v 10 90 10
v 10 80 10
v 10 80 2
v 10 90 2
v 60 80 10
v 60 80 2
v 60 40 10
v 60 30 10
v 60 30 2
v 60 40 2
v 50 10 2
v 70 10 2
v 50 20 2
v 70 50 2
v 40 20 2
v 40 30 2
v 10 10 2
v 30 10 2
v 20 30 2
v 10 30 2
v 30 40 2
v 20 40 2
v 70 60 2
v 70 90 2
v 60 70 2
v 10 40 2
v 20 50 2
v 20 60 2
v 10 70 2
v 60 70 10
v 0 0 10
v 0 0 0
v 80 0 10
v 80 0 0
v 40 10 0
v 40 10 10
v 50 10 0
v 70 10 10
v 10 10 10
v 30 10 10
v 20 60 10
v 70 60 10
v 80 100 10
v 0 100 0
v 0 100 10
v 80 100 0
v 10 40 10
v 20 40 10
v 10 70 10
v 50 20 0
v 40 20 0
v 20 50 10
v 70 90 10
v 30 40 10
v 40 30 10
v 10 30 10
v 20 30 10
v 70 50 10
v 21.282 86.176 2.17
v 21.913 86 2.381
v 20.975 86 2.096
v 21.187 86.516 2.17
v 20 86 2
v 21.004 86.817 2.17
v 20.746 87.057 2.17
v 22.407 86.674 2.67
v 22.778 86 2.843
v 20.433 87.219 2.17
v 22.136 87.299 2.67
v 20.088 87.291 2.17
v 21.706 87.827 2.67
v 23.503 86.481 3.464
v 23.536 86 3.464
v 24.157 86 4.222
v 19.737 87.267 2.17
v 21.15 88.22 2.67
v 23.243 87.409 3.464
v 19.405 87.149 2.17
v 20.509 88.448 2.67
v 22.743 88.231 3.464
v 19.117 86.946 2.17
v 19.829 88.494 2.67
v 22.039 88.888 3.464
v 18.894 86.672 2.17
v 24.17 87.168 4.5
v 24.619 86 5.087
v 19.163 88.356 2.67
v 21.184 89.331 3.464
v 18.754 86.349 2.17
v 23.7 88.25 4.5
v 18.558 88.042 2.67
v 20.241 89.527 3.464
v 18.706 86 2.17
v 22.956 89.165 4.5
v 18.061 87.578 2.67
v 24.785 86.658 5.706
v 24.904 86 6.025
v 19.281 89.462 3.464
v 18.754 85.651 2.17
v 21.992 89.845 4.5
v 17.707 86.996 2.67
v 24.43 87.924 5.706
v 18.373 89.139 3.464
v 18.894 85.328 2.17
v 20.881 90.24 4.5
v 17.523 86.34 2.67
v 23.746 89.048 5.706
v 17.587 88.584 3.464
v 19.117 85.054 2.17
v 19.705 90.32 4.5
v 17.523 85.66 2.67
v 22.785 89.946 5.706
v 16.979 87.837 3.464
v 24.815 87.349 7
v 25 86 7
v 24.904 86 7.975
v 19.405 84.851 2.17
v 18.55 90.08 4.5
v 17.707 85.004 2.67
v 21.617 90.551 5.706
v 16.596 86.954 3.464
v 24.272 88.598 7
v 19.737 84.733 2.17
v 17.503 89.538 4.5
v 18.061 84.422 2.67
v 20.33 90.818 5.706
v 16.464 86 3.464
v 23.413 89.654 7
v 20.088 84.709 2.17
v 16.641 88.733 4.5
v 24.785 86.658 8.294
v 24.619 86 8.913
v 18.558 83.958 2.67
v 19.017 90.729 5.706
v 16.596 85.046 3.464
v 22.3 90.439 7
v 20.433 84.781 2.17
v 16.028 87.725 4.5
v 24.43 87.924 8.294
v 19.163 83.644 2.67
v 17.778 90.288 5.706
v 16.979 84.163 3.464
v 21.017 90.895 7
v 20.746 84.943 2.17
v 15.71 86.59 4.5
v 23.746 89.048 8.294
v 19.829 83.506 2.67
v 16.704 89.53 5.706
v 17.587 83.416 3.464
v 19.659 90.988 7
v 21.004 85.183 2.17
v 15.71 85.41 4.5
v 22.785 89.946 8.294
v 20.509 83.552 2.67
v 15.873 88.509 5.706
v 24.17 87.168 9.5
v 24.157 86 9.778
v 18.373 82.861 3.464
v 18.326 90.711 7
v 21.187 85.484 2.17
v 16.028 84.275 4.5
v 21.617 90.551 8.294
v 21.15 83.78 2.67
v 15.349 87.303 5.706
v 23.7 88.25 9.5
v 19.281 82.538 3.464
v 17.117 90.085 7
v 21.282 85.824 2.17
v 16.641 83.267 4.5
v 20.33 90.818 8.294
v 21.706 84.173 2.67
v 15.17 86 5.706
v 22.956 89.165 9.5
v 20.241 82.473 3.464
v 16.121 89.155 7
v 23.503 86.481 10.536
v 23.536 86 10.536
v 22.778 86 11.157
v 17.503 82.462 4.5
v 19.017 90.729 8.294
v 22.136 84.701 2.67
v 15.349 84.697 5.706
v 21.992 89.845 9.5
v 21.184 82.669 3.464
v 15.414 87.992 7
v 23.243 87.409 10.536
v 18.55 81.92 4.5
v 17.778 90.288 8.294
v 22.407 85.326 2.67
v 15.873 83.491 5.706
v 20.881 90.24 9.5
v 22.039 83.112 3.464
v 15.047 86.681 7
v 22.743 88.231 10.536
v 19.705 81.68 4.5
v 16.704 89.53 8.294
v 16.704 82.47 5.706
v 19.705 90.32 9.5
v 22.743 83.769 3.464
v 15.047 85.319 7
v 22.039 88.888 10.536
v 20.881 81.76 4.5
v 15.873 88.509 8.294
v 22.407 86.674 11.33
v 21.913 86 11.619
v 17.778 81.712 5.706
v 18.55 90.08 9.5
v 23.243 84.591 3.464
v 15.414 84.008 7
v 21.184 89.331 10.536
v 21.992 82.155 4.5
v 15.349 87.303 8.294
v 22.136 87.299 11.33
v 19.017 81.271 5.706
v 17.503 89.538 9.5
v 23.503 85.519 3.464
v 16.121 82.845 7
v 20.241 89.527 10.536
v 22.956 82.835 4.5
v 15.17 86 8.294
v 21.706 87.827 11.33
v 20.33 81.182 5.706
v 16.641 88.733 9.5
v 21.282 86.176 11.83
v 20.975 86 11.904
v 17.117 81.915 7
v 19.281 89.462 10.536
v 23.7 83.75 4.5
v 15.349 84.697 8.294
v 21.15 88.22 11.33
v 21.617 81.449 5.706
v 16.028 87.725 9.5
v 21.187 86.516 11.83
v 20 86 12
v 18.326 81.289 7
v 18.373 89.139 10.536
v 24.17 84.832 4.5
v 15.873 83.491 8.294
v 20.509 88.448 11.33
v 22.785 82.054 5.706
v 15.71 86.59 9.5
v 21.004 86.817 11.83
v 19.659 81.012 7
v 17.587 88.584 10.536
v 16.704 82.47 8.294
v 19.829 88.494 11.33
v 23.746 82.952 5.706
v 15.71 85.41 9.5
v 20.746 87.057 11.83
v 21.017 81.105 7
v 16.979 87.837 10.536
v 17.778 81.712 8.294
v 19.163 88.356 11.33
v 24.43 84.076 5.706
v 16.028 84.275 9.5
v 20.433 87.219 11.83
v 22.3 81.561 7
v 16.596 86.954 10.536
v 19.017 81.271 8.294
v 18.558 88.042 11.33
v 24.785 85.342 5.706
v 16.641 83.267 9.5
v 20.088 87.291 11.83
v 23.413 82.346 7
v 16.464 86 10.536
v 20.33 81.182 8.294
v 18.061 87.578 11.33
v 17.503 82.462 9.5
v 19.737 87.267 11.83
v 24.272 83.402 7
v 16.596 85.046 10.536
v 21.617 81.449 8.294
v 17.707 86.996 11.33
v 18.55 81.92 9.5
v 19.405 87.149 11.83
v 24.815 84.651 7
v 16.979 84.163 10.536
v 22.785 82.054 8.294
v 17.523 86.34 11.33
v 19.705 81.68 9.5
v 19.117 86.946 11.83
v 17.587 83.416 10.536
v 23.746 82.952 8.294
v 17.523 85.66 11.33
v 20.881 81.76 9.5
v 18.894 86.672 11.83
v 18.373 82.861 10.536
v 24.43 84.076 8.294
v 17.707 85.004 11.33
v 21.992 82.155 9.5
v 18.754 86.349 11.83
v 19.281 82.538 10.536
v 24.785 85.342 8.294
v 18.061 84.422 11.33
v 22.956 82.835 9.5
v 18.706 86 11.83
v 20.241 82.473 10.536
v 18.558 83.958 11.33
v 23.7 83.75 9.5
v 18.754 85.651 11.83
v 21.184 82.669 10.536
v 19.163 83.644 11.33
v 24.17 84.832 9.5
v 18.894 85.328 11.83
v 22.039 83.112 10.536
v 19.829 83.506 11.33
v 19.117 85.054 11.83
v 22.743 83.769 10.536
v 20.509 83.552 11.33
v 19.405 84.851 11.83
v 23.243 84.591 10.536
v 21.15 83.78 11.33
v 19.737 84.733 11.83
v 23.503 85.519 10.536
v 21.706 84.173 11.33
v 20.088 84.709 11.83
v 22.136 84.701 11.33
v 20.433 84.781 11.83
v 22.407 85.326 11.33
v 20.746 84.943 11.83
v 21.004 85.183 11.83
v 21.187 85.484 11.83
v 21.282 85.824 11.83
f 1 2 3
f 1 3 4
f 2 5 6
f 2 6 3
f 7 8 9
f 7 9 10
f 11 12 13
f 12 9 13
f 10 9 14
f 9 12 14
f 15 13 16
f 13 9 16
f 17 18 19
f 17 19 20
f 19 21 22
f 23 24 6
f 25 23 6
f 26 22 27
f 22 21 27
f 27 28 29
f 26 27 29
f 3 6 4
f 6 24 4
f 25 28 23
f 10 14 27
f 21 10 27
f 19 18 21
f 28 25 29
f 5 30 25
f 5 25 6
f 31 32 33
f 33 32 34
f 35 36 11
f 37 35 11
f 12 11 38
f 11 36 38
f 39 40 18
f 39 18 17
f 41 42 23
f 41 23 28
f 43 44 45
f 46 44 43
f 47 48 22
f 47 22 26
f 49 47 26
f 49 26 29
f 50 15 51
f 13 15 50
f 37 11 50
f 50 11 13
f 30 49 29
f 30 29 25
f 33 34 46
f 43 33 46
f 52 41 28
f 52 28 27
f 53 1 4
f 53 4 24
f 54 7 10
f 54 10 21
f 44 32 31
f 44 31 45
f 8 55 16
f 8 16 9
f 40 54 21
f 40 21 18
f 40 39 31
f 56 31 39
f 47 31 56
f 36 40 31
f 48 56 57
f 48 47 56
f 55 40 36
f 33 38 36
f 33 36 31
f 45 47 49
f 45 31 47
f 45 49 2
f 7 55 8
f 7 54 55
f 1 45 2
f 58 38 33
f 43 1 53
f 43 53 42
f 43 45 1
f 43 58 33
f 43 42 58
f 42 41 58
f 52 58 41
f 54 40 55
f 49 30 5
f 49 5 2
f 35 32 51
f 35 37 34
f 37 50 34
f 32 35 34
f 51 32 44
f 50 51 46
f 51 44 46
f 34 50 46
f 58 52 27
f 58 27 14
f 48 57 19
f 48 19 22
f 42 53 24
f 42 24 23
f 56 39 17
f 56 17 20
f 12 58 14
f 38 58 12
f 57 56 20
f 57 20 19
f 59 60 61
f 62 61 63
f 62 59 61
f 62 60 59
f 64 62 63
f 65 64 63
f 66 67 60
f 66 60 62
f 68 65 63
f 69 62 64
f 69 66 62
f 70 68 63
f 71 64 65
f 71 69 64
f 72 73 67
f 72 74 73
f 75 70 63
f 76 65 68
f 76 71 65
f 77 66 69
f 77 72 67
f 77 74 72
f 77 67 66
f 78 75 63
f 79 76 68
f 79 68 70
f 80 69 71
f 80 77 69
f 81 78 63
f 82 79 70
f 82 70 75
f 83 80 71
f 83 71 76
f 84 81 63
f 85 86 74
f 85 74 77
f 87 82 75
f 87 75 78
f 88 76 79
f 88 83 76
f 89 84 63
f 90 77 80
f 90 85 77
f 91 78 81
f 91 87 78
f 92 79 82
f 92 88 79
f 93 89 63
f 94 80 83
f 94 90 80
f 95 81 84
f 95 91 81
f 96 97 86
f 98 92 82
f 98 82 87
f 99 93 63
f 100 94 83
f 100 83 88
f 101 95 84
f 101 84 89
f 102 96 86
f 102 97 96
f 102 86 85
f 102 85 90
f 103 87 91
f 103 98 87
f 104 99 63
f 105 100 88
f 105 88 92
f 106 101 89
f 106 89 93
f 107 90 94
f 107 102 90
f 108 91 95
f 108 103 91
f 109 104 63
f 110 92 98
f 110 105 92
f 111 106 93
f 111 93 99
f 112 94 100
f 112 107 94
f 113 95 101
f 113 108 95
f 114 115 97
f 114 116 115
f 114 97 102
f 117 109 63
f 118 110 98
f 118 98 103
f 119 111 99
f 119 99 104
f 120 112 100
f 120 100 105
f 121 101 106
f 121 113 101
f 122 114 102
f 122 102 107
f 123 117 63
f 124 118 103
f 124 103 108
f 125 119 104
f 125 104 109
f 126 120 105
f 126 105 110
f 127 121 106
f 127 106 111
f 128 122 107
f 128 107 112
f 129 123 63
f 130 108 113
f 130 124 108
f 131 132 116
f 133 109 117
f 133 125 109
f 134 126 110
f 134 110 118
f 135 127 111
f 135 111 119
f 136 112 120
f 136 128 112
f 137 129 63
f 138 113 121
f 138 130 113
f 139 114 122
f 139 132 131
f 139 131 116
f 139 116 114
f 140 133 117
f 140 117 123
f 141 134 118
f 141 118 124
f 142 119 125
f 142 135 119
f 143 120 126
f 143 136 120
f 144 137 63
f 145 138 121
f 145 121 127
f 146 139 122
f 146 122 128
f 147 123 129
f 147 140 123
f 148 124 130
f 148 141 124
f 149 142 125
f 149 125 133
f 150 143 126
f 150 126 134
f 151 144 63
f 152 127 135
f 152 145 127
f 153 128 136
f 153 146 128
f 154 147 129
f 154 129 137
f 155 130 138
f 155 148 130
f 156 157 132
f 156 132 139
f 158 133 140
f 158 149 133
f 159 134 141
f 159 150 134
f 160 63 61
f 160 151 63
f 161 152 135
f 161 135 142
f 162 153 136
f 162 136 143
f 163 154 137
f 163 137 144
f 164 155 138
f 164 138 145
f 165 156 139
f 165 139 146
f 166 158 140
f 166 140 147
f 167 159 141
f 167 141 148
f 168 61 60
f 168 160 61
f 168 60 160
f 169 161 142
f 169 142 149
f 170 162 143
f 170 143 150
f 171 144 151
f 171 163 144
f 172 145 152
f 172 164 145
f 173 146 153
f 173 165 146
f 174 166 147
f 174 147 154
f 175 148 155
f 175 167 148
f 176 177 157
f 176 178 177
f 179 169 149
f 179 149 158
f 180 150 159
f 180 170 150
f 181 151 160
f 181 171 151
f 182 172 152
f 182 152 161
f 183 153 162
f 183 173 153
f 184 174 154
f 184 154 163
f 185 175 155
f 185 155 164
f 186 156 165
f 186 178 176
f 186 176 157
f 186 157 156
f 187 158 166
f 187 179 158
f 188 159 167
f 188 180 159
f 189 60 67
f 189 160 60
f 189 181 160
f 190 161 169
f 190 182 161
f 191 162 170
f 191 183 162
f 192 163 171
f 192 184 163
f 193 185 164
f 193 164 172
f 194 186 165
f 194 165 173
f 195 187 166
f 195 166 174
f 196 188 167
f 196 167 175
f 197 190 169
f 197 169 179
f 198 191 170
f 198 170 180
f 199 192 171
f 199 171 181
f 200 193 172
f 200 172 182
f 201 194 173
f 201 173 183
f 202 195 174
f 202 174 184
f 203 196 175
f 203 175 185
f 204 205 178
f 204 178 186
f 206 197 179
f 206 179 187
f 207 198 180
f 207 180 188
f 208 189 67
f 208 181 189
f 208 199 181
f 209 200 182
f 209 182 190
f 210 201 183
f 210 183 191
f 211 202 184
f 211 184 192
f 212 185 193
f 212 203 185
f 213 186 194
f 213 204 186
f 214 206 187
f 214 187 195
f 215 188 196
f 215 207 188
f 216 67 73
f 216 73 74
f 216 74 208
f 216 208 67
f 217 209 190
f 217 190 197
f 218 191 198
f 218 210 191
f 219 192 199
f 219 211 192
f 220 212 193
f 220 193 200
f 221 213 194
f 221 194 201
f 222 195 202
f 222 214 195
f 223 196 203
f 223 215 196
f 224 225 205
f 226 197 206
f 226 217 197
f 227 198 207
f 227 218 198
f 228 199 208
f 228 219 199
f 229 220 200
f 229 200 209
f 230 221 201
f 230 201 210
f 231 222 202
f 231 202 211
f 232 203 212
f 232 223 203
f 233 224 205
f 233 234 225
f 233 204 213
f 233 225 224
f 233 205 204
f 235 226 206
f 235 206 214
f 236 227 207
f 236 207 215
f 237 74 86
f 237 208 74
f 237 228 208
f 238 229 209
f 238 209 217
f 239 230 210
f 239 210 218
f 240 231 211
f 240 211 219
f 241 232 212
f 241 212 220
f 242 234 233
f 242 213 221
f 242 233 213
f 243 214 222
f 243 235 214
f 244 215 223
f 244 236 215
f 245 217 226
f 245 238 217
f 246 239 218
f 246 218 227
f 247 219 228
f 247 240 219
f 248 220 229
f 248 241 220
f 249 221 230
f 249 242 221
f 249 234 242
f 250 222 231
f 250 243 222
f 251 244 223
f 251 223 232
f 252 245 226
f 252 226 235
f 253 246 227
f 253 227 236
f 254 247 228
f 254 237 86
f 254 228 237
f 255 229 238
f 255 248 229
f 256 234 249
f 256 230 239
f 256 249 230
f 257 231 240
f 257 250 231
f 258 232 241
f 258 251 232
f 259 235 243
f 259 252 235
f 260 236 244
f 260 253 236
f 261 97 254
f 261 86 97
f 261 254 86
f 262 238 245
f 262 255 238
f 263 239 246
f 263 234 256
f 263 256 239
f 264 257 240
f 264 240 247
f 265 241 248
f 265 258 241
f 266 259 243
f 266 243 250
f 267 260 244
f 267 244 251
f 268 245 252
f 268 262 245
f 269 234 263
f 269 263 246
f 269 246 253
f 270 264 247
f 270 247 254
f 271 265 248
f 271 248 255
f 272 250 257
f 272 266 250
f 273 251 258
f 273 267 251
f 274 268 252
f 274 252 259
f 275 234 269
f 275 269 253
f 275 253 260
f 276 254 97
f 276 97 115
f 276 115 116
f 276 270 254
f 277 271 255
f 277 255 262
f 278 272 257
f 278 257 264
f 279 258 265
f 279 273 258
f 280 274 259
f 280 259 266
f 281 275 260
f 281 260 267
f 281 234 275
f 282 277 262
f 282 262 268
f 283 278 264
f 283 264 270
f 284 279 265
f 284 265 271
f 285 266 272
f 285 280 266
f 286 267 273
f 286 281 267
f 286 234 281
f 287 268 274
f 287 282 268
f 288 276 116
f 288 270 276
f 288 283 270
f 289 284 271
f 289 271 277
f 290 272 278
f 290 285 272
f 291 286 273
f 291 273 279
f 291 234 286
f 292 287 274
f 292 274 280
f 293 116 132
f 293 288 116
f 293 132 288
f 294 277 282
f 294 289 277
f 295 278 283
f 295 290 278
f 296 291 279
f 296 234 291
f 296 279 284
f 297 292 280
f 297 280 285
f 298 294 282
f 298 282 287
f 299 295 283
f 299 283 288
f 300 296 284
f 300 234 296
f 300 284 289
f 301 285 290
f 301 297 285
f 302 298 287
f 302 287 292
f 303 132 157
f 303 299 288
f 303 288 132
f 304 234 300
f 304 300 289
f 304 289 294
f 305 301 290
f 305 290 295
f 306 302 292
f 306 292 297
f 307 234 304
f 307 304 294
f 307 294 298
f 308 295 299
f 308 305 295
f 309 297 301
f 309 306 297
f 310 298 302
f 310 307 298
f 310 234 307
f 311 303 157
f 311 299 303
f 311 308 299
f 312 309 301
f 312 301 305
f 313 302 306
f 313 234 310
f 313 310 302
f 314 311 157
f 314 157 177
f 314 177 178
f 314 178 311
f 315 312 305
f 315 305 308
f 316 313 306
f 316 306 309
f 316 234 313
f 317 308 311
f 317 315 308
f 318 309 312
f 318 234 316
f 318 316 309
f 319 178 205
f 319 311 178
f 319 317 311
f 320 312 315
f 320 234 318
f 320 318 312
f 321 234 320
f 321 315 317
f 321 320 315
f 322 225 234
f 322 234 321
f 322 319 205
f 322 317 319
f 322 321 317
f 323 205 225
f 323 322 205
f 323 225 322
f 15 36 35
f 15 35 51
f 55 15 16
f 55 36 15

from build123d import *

# Parameters (mm, degrees)
SKETCH_W        = 80
SKETCH_H        = 100
PAD_DEPTH       = 10
POCKET_DEPTH    = 8
SKETCH002_W     = 10
SKETCH002_H     = 10
POCKET001_DEPTH = 5


with BuildPart() as body:
    # Sketch → Pad (new body)
    with BuildSketch(Plane.XY):
        with Locations((40, 50)):
            Rectangle(SKETCH_W, SKETCH_H)
    extrude(amount=PAD_DEPTH)

    # Sketch001 (on Face6 of Pad) → Pocket (cut)
    with BuildSketch(Plane.XY.offset(10)):
        Polygon((10, 90), (70, 90), (70, 60), (20, 60), (20, 50), (70, 50), (70, 10), (40, 10), (40, 30), (60, 30), (60, 40), (30, 40), (30, 10), (10, 10), (10, 30), (20, 30), (20, 40), (10, 40), (10, 70), (60, 70), (60, 80), (10, 80), align=None)
    extrude(amount=-POCKET_DEPTH, mode=Mode.SUBTRACT)

    # Sketch002 (on Face29 of Pocket) → Pocket001 (cut)
    with BuildSketch(Plane.XY.offset(2)):
        with Locations((45, 15)):
            Rectangle(SKETCH002_W, SKETCH002_H)
    extrude(amount=-POCKET001_DEPTH, mode=Mode.SUBTRACT)


with BuildPart() as esfera:
    # Sphere → Sphere (revolve)
    with BuildSketch(Plane(origin=(20, 86, 7), x_dir=(1, 0, 0), z_dir=(0, -1, 0))):
        with BuildLine():
            ThreePointArc((0, -5), (5, 0), (0, 5))
            Line((0, 5), (0, -5))
        make_face()
    revolve(axis=Axis((20, 86, 7), (0, 0, 1)))


solid = Compound([body.part, esfera.part])
